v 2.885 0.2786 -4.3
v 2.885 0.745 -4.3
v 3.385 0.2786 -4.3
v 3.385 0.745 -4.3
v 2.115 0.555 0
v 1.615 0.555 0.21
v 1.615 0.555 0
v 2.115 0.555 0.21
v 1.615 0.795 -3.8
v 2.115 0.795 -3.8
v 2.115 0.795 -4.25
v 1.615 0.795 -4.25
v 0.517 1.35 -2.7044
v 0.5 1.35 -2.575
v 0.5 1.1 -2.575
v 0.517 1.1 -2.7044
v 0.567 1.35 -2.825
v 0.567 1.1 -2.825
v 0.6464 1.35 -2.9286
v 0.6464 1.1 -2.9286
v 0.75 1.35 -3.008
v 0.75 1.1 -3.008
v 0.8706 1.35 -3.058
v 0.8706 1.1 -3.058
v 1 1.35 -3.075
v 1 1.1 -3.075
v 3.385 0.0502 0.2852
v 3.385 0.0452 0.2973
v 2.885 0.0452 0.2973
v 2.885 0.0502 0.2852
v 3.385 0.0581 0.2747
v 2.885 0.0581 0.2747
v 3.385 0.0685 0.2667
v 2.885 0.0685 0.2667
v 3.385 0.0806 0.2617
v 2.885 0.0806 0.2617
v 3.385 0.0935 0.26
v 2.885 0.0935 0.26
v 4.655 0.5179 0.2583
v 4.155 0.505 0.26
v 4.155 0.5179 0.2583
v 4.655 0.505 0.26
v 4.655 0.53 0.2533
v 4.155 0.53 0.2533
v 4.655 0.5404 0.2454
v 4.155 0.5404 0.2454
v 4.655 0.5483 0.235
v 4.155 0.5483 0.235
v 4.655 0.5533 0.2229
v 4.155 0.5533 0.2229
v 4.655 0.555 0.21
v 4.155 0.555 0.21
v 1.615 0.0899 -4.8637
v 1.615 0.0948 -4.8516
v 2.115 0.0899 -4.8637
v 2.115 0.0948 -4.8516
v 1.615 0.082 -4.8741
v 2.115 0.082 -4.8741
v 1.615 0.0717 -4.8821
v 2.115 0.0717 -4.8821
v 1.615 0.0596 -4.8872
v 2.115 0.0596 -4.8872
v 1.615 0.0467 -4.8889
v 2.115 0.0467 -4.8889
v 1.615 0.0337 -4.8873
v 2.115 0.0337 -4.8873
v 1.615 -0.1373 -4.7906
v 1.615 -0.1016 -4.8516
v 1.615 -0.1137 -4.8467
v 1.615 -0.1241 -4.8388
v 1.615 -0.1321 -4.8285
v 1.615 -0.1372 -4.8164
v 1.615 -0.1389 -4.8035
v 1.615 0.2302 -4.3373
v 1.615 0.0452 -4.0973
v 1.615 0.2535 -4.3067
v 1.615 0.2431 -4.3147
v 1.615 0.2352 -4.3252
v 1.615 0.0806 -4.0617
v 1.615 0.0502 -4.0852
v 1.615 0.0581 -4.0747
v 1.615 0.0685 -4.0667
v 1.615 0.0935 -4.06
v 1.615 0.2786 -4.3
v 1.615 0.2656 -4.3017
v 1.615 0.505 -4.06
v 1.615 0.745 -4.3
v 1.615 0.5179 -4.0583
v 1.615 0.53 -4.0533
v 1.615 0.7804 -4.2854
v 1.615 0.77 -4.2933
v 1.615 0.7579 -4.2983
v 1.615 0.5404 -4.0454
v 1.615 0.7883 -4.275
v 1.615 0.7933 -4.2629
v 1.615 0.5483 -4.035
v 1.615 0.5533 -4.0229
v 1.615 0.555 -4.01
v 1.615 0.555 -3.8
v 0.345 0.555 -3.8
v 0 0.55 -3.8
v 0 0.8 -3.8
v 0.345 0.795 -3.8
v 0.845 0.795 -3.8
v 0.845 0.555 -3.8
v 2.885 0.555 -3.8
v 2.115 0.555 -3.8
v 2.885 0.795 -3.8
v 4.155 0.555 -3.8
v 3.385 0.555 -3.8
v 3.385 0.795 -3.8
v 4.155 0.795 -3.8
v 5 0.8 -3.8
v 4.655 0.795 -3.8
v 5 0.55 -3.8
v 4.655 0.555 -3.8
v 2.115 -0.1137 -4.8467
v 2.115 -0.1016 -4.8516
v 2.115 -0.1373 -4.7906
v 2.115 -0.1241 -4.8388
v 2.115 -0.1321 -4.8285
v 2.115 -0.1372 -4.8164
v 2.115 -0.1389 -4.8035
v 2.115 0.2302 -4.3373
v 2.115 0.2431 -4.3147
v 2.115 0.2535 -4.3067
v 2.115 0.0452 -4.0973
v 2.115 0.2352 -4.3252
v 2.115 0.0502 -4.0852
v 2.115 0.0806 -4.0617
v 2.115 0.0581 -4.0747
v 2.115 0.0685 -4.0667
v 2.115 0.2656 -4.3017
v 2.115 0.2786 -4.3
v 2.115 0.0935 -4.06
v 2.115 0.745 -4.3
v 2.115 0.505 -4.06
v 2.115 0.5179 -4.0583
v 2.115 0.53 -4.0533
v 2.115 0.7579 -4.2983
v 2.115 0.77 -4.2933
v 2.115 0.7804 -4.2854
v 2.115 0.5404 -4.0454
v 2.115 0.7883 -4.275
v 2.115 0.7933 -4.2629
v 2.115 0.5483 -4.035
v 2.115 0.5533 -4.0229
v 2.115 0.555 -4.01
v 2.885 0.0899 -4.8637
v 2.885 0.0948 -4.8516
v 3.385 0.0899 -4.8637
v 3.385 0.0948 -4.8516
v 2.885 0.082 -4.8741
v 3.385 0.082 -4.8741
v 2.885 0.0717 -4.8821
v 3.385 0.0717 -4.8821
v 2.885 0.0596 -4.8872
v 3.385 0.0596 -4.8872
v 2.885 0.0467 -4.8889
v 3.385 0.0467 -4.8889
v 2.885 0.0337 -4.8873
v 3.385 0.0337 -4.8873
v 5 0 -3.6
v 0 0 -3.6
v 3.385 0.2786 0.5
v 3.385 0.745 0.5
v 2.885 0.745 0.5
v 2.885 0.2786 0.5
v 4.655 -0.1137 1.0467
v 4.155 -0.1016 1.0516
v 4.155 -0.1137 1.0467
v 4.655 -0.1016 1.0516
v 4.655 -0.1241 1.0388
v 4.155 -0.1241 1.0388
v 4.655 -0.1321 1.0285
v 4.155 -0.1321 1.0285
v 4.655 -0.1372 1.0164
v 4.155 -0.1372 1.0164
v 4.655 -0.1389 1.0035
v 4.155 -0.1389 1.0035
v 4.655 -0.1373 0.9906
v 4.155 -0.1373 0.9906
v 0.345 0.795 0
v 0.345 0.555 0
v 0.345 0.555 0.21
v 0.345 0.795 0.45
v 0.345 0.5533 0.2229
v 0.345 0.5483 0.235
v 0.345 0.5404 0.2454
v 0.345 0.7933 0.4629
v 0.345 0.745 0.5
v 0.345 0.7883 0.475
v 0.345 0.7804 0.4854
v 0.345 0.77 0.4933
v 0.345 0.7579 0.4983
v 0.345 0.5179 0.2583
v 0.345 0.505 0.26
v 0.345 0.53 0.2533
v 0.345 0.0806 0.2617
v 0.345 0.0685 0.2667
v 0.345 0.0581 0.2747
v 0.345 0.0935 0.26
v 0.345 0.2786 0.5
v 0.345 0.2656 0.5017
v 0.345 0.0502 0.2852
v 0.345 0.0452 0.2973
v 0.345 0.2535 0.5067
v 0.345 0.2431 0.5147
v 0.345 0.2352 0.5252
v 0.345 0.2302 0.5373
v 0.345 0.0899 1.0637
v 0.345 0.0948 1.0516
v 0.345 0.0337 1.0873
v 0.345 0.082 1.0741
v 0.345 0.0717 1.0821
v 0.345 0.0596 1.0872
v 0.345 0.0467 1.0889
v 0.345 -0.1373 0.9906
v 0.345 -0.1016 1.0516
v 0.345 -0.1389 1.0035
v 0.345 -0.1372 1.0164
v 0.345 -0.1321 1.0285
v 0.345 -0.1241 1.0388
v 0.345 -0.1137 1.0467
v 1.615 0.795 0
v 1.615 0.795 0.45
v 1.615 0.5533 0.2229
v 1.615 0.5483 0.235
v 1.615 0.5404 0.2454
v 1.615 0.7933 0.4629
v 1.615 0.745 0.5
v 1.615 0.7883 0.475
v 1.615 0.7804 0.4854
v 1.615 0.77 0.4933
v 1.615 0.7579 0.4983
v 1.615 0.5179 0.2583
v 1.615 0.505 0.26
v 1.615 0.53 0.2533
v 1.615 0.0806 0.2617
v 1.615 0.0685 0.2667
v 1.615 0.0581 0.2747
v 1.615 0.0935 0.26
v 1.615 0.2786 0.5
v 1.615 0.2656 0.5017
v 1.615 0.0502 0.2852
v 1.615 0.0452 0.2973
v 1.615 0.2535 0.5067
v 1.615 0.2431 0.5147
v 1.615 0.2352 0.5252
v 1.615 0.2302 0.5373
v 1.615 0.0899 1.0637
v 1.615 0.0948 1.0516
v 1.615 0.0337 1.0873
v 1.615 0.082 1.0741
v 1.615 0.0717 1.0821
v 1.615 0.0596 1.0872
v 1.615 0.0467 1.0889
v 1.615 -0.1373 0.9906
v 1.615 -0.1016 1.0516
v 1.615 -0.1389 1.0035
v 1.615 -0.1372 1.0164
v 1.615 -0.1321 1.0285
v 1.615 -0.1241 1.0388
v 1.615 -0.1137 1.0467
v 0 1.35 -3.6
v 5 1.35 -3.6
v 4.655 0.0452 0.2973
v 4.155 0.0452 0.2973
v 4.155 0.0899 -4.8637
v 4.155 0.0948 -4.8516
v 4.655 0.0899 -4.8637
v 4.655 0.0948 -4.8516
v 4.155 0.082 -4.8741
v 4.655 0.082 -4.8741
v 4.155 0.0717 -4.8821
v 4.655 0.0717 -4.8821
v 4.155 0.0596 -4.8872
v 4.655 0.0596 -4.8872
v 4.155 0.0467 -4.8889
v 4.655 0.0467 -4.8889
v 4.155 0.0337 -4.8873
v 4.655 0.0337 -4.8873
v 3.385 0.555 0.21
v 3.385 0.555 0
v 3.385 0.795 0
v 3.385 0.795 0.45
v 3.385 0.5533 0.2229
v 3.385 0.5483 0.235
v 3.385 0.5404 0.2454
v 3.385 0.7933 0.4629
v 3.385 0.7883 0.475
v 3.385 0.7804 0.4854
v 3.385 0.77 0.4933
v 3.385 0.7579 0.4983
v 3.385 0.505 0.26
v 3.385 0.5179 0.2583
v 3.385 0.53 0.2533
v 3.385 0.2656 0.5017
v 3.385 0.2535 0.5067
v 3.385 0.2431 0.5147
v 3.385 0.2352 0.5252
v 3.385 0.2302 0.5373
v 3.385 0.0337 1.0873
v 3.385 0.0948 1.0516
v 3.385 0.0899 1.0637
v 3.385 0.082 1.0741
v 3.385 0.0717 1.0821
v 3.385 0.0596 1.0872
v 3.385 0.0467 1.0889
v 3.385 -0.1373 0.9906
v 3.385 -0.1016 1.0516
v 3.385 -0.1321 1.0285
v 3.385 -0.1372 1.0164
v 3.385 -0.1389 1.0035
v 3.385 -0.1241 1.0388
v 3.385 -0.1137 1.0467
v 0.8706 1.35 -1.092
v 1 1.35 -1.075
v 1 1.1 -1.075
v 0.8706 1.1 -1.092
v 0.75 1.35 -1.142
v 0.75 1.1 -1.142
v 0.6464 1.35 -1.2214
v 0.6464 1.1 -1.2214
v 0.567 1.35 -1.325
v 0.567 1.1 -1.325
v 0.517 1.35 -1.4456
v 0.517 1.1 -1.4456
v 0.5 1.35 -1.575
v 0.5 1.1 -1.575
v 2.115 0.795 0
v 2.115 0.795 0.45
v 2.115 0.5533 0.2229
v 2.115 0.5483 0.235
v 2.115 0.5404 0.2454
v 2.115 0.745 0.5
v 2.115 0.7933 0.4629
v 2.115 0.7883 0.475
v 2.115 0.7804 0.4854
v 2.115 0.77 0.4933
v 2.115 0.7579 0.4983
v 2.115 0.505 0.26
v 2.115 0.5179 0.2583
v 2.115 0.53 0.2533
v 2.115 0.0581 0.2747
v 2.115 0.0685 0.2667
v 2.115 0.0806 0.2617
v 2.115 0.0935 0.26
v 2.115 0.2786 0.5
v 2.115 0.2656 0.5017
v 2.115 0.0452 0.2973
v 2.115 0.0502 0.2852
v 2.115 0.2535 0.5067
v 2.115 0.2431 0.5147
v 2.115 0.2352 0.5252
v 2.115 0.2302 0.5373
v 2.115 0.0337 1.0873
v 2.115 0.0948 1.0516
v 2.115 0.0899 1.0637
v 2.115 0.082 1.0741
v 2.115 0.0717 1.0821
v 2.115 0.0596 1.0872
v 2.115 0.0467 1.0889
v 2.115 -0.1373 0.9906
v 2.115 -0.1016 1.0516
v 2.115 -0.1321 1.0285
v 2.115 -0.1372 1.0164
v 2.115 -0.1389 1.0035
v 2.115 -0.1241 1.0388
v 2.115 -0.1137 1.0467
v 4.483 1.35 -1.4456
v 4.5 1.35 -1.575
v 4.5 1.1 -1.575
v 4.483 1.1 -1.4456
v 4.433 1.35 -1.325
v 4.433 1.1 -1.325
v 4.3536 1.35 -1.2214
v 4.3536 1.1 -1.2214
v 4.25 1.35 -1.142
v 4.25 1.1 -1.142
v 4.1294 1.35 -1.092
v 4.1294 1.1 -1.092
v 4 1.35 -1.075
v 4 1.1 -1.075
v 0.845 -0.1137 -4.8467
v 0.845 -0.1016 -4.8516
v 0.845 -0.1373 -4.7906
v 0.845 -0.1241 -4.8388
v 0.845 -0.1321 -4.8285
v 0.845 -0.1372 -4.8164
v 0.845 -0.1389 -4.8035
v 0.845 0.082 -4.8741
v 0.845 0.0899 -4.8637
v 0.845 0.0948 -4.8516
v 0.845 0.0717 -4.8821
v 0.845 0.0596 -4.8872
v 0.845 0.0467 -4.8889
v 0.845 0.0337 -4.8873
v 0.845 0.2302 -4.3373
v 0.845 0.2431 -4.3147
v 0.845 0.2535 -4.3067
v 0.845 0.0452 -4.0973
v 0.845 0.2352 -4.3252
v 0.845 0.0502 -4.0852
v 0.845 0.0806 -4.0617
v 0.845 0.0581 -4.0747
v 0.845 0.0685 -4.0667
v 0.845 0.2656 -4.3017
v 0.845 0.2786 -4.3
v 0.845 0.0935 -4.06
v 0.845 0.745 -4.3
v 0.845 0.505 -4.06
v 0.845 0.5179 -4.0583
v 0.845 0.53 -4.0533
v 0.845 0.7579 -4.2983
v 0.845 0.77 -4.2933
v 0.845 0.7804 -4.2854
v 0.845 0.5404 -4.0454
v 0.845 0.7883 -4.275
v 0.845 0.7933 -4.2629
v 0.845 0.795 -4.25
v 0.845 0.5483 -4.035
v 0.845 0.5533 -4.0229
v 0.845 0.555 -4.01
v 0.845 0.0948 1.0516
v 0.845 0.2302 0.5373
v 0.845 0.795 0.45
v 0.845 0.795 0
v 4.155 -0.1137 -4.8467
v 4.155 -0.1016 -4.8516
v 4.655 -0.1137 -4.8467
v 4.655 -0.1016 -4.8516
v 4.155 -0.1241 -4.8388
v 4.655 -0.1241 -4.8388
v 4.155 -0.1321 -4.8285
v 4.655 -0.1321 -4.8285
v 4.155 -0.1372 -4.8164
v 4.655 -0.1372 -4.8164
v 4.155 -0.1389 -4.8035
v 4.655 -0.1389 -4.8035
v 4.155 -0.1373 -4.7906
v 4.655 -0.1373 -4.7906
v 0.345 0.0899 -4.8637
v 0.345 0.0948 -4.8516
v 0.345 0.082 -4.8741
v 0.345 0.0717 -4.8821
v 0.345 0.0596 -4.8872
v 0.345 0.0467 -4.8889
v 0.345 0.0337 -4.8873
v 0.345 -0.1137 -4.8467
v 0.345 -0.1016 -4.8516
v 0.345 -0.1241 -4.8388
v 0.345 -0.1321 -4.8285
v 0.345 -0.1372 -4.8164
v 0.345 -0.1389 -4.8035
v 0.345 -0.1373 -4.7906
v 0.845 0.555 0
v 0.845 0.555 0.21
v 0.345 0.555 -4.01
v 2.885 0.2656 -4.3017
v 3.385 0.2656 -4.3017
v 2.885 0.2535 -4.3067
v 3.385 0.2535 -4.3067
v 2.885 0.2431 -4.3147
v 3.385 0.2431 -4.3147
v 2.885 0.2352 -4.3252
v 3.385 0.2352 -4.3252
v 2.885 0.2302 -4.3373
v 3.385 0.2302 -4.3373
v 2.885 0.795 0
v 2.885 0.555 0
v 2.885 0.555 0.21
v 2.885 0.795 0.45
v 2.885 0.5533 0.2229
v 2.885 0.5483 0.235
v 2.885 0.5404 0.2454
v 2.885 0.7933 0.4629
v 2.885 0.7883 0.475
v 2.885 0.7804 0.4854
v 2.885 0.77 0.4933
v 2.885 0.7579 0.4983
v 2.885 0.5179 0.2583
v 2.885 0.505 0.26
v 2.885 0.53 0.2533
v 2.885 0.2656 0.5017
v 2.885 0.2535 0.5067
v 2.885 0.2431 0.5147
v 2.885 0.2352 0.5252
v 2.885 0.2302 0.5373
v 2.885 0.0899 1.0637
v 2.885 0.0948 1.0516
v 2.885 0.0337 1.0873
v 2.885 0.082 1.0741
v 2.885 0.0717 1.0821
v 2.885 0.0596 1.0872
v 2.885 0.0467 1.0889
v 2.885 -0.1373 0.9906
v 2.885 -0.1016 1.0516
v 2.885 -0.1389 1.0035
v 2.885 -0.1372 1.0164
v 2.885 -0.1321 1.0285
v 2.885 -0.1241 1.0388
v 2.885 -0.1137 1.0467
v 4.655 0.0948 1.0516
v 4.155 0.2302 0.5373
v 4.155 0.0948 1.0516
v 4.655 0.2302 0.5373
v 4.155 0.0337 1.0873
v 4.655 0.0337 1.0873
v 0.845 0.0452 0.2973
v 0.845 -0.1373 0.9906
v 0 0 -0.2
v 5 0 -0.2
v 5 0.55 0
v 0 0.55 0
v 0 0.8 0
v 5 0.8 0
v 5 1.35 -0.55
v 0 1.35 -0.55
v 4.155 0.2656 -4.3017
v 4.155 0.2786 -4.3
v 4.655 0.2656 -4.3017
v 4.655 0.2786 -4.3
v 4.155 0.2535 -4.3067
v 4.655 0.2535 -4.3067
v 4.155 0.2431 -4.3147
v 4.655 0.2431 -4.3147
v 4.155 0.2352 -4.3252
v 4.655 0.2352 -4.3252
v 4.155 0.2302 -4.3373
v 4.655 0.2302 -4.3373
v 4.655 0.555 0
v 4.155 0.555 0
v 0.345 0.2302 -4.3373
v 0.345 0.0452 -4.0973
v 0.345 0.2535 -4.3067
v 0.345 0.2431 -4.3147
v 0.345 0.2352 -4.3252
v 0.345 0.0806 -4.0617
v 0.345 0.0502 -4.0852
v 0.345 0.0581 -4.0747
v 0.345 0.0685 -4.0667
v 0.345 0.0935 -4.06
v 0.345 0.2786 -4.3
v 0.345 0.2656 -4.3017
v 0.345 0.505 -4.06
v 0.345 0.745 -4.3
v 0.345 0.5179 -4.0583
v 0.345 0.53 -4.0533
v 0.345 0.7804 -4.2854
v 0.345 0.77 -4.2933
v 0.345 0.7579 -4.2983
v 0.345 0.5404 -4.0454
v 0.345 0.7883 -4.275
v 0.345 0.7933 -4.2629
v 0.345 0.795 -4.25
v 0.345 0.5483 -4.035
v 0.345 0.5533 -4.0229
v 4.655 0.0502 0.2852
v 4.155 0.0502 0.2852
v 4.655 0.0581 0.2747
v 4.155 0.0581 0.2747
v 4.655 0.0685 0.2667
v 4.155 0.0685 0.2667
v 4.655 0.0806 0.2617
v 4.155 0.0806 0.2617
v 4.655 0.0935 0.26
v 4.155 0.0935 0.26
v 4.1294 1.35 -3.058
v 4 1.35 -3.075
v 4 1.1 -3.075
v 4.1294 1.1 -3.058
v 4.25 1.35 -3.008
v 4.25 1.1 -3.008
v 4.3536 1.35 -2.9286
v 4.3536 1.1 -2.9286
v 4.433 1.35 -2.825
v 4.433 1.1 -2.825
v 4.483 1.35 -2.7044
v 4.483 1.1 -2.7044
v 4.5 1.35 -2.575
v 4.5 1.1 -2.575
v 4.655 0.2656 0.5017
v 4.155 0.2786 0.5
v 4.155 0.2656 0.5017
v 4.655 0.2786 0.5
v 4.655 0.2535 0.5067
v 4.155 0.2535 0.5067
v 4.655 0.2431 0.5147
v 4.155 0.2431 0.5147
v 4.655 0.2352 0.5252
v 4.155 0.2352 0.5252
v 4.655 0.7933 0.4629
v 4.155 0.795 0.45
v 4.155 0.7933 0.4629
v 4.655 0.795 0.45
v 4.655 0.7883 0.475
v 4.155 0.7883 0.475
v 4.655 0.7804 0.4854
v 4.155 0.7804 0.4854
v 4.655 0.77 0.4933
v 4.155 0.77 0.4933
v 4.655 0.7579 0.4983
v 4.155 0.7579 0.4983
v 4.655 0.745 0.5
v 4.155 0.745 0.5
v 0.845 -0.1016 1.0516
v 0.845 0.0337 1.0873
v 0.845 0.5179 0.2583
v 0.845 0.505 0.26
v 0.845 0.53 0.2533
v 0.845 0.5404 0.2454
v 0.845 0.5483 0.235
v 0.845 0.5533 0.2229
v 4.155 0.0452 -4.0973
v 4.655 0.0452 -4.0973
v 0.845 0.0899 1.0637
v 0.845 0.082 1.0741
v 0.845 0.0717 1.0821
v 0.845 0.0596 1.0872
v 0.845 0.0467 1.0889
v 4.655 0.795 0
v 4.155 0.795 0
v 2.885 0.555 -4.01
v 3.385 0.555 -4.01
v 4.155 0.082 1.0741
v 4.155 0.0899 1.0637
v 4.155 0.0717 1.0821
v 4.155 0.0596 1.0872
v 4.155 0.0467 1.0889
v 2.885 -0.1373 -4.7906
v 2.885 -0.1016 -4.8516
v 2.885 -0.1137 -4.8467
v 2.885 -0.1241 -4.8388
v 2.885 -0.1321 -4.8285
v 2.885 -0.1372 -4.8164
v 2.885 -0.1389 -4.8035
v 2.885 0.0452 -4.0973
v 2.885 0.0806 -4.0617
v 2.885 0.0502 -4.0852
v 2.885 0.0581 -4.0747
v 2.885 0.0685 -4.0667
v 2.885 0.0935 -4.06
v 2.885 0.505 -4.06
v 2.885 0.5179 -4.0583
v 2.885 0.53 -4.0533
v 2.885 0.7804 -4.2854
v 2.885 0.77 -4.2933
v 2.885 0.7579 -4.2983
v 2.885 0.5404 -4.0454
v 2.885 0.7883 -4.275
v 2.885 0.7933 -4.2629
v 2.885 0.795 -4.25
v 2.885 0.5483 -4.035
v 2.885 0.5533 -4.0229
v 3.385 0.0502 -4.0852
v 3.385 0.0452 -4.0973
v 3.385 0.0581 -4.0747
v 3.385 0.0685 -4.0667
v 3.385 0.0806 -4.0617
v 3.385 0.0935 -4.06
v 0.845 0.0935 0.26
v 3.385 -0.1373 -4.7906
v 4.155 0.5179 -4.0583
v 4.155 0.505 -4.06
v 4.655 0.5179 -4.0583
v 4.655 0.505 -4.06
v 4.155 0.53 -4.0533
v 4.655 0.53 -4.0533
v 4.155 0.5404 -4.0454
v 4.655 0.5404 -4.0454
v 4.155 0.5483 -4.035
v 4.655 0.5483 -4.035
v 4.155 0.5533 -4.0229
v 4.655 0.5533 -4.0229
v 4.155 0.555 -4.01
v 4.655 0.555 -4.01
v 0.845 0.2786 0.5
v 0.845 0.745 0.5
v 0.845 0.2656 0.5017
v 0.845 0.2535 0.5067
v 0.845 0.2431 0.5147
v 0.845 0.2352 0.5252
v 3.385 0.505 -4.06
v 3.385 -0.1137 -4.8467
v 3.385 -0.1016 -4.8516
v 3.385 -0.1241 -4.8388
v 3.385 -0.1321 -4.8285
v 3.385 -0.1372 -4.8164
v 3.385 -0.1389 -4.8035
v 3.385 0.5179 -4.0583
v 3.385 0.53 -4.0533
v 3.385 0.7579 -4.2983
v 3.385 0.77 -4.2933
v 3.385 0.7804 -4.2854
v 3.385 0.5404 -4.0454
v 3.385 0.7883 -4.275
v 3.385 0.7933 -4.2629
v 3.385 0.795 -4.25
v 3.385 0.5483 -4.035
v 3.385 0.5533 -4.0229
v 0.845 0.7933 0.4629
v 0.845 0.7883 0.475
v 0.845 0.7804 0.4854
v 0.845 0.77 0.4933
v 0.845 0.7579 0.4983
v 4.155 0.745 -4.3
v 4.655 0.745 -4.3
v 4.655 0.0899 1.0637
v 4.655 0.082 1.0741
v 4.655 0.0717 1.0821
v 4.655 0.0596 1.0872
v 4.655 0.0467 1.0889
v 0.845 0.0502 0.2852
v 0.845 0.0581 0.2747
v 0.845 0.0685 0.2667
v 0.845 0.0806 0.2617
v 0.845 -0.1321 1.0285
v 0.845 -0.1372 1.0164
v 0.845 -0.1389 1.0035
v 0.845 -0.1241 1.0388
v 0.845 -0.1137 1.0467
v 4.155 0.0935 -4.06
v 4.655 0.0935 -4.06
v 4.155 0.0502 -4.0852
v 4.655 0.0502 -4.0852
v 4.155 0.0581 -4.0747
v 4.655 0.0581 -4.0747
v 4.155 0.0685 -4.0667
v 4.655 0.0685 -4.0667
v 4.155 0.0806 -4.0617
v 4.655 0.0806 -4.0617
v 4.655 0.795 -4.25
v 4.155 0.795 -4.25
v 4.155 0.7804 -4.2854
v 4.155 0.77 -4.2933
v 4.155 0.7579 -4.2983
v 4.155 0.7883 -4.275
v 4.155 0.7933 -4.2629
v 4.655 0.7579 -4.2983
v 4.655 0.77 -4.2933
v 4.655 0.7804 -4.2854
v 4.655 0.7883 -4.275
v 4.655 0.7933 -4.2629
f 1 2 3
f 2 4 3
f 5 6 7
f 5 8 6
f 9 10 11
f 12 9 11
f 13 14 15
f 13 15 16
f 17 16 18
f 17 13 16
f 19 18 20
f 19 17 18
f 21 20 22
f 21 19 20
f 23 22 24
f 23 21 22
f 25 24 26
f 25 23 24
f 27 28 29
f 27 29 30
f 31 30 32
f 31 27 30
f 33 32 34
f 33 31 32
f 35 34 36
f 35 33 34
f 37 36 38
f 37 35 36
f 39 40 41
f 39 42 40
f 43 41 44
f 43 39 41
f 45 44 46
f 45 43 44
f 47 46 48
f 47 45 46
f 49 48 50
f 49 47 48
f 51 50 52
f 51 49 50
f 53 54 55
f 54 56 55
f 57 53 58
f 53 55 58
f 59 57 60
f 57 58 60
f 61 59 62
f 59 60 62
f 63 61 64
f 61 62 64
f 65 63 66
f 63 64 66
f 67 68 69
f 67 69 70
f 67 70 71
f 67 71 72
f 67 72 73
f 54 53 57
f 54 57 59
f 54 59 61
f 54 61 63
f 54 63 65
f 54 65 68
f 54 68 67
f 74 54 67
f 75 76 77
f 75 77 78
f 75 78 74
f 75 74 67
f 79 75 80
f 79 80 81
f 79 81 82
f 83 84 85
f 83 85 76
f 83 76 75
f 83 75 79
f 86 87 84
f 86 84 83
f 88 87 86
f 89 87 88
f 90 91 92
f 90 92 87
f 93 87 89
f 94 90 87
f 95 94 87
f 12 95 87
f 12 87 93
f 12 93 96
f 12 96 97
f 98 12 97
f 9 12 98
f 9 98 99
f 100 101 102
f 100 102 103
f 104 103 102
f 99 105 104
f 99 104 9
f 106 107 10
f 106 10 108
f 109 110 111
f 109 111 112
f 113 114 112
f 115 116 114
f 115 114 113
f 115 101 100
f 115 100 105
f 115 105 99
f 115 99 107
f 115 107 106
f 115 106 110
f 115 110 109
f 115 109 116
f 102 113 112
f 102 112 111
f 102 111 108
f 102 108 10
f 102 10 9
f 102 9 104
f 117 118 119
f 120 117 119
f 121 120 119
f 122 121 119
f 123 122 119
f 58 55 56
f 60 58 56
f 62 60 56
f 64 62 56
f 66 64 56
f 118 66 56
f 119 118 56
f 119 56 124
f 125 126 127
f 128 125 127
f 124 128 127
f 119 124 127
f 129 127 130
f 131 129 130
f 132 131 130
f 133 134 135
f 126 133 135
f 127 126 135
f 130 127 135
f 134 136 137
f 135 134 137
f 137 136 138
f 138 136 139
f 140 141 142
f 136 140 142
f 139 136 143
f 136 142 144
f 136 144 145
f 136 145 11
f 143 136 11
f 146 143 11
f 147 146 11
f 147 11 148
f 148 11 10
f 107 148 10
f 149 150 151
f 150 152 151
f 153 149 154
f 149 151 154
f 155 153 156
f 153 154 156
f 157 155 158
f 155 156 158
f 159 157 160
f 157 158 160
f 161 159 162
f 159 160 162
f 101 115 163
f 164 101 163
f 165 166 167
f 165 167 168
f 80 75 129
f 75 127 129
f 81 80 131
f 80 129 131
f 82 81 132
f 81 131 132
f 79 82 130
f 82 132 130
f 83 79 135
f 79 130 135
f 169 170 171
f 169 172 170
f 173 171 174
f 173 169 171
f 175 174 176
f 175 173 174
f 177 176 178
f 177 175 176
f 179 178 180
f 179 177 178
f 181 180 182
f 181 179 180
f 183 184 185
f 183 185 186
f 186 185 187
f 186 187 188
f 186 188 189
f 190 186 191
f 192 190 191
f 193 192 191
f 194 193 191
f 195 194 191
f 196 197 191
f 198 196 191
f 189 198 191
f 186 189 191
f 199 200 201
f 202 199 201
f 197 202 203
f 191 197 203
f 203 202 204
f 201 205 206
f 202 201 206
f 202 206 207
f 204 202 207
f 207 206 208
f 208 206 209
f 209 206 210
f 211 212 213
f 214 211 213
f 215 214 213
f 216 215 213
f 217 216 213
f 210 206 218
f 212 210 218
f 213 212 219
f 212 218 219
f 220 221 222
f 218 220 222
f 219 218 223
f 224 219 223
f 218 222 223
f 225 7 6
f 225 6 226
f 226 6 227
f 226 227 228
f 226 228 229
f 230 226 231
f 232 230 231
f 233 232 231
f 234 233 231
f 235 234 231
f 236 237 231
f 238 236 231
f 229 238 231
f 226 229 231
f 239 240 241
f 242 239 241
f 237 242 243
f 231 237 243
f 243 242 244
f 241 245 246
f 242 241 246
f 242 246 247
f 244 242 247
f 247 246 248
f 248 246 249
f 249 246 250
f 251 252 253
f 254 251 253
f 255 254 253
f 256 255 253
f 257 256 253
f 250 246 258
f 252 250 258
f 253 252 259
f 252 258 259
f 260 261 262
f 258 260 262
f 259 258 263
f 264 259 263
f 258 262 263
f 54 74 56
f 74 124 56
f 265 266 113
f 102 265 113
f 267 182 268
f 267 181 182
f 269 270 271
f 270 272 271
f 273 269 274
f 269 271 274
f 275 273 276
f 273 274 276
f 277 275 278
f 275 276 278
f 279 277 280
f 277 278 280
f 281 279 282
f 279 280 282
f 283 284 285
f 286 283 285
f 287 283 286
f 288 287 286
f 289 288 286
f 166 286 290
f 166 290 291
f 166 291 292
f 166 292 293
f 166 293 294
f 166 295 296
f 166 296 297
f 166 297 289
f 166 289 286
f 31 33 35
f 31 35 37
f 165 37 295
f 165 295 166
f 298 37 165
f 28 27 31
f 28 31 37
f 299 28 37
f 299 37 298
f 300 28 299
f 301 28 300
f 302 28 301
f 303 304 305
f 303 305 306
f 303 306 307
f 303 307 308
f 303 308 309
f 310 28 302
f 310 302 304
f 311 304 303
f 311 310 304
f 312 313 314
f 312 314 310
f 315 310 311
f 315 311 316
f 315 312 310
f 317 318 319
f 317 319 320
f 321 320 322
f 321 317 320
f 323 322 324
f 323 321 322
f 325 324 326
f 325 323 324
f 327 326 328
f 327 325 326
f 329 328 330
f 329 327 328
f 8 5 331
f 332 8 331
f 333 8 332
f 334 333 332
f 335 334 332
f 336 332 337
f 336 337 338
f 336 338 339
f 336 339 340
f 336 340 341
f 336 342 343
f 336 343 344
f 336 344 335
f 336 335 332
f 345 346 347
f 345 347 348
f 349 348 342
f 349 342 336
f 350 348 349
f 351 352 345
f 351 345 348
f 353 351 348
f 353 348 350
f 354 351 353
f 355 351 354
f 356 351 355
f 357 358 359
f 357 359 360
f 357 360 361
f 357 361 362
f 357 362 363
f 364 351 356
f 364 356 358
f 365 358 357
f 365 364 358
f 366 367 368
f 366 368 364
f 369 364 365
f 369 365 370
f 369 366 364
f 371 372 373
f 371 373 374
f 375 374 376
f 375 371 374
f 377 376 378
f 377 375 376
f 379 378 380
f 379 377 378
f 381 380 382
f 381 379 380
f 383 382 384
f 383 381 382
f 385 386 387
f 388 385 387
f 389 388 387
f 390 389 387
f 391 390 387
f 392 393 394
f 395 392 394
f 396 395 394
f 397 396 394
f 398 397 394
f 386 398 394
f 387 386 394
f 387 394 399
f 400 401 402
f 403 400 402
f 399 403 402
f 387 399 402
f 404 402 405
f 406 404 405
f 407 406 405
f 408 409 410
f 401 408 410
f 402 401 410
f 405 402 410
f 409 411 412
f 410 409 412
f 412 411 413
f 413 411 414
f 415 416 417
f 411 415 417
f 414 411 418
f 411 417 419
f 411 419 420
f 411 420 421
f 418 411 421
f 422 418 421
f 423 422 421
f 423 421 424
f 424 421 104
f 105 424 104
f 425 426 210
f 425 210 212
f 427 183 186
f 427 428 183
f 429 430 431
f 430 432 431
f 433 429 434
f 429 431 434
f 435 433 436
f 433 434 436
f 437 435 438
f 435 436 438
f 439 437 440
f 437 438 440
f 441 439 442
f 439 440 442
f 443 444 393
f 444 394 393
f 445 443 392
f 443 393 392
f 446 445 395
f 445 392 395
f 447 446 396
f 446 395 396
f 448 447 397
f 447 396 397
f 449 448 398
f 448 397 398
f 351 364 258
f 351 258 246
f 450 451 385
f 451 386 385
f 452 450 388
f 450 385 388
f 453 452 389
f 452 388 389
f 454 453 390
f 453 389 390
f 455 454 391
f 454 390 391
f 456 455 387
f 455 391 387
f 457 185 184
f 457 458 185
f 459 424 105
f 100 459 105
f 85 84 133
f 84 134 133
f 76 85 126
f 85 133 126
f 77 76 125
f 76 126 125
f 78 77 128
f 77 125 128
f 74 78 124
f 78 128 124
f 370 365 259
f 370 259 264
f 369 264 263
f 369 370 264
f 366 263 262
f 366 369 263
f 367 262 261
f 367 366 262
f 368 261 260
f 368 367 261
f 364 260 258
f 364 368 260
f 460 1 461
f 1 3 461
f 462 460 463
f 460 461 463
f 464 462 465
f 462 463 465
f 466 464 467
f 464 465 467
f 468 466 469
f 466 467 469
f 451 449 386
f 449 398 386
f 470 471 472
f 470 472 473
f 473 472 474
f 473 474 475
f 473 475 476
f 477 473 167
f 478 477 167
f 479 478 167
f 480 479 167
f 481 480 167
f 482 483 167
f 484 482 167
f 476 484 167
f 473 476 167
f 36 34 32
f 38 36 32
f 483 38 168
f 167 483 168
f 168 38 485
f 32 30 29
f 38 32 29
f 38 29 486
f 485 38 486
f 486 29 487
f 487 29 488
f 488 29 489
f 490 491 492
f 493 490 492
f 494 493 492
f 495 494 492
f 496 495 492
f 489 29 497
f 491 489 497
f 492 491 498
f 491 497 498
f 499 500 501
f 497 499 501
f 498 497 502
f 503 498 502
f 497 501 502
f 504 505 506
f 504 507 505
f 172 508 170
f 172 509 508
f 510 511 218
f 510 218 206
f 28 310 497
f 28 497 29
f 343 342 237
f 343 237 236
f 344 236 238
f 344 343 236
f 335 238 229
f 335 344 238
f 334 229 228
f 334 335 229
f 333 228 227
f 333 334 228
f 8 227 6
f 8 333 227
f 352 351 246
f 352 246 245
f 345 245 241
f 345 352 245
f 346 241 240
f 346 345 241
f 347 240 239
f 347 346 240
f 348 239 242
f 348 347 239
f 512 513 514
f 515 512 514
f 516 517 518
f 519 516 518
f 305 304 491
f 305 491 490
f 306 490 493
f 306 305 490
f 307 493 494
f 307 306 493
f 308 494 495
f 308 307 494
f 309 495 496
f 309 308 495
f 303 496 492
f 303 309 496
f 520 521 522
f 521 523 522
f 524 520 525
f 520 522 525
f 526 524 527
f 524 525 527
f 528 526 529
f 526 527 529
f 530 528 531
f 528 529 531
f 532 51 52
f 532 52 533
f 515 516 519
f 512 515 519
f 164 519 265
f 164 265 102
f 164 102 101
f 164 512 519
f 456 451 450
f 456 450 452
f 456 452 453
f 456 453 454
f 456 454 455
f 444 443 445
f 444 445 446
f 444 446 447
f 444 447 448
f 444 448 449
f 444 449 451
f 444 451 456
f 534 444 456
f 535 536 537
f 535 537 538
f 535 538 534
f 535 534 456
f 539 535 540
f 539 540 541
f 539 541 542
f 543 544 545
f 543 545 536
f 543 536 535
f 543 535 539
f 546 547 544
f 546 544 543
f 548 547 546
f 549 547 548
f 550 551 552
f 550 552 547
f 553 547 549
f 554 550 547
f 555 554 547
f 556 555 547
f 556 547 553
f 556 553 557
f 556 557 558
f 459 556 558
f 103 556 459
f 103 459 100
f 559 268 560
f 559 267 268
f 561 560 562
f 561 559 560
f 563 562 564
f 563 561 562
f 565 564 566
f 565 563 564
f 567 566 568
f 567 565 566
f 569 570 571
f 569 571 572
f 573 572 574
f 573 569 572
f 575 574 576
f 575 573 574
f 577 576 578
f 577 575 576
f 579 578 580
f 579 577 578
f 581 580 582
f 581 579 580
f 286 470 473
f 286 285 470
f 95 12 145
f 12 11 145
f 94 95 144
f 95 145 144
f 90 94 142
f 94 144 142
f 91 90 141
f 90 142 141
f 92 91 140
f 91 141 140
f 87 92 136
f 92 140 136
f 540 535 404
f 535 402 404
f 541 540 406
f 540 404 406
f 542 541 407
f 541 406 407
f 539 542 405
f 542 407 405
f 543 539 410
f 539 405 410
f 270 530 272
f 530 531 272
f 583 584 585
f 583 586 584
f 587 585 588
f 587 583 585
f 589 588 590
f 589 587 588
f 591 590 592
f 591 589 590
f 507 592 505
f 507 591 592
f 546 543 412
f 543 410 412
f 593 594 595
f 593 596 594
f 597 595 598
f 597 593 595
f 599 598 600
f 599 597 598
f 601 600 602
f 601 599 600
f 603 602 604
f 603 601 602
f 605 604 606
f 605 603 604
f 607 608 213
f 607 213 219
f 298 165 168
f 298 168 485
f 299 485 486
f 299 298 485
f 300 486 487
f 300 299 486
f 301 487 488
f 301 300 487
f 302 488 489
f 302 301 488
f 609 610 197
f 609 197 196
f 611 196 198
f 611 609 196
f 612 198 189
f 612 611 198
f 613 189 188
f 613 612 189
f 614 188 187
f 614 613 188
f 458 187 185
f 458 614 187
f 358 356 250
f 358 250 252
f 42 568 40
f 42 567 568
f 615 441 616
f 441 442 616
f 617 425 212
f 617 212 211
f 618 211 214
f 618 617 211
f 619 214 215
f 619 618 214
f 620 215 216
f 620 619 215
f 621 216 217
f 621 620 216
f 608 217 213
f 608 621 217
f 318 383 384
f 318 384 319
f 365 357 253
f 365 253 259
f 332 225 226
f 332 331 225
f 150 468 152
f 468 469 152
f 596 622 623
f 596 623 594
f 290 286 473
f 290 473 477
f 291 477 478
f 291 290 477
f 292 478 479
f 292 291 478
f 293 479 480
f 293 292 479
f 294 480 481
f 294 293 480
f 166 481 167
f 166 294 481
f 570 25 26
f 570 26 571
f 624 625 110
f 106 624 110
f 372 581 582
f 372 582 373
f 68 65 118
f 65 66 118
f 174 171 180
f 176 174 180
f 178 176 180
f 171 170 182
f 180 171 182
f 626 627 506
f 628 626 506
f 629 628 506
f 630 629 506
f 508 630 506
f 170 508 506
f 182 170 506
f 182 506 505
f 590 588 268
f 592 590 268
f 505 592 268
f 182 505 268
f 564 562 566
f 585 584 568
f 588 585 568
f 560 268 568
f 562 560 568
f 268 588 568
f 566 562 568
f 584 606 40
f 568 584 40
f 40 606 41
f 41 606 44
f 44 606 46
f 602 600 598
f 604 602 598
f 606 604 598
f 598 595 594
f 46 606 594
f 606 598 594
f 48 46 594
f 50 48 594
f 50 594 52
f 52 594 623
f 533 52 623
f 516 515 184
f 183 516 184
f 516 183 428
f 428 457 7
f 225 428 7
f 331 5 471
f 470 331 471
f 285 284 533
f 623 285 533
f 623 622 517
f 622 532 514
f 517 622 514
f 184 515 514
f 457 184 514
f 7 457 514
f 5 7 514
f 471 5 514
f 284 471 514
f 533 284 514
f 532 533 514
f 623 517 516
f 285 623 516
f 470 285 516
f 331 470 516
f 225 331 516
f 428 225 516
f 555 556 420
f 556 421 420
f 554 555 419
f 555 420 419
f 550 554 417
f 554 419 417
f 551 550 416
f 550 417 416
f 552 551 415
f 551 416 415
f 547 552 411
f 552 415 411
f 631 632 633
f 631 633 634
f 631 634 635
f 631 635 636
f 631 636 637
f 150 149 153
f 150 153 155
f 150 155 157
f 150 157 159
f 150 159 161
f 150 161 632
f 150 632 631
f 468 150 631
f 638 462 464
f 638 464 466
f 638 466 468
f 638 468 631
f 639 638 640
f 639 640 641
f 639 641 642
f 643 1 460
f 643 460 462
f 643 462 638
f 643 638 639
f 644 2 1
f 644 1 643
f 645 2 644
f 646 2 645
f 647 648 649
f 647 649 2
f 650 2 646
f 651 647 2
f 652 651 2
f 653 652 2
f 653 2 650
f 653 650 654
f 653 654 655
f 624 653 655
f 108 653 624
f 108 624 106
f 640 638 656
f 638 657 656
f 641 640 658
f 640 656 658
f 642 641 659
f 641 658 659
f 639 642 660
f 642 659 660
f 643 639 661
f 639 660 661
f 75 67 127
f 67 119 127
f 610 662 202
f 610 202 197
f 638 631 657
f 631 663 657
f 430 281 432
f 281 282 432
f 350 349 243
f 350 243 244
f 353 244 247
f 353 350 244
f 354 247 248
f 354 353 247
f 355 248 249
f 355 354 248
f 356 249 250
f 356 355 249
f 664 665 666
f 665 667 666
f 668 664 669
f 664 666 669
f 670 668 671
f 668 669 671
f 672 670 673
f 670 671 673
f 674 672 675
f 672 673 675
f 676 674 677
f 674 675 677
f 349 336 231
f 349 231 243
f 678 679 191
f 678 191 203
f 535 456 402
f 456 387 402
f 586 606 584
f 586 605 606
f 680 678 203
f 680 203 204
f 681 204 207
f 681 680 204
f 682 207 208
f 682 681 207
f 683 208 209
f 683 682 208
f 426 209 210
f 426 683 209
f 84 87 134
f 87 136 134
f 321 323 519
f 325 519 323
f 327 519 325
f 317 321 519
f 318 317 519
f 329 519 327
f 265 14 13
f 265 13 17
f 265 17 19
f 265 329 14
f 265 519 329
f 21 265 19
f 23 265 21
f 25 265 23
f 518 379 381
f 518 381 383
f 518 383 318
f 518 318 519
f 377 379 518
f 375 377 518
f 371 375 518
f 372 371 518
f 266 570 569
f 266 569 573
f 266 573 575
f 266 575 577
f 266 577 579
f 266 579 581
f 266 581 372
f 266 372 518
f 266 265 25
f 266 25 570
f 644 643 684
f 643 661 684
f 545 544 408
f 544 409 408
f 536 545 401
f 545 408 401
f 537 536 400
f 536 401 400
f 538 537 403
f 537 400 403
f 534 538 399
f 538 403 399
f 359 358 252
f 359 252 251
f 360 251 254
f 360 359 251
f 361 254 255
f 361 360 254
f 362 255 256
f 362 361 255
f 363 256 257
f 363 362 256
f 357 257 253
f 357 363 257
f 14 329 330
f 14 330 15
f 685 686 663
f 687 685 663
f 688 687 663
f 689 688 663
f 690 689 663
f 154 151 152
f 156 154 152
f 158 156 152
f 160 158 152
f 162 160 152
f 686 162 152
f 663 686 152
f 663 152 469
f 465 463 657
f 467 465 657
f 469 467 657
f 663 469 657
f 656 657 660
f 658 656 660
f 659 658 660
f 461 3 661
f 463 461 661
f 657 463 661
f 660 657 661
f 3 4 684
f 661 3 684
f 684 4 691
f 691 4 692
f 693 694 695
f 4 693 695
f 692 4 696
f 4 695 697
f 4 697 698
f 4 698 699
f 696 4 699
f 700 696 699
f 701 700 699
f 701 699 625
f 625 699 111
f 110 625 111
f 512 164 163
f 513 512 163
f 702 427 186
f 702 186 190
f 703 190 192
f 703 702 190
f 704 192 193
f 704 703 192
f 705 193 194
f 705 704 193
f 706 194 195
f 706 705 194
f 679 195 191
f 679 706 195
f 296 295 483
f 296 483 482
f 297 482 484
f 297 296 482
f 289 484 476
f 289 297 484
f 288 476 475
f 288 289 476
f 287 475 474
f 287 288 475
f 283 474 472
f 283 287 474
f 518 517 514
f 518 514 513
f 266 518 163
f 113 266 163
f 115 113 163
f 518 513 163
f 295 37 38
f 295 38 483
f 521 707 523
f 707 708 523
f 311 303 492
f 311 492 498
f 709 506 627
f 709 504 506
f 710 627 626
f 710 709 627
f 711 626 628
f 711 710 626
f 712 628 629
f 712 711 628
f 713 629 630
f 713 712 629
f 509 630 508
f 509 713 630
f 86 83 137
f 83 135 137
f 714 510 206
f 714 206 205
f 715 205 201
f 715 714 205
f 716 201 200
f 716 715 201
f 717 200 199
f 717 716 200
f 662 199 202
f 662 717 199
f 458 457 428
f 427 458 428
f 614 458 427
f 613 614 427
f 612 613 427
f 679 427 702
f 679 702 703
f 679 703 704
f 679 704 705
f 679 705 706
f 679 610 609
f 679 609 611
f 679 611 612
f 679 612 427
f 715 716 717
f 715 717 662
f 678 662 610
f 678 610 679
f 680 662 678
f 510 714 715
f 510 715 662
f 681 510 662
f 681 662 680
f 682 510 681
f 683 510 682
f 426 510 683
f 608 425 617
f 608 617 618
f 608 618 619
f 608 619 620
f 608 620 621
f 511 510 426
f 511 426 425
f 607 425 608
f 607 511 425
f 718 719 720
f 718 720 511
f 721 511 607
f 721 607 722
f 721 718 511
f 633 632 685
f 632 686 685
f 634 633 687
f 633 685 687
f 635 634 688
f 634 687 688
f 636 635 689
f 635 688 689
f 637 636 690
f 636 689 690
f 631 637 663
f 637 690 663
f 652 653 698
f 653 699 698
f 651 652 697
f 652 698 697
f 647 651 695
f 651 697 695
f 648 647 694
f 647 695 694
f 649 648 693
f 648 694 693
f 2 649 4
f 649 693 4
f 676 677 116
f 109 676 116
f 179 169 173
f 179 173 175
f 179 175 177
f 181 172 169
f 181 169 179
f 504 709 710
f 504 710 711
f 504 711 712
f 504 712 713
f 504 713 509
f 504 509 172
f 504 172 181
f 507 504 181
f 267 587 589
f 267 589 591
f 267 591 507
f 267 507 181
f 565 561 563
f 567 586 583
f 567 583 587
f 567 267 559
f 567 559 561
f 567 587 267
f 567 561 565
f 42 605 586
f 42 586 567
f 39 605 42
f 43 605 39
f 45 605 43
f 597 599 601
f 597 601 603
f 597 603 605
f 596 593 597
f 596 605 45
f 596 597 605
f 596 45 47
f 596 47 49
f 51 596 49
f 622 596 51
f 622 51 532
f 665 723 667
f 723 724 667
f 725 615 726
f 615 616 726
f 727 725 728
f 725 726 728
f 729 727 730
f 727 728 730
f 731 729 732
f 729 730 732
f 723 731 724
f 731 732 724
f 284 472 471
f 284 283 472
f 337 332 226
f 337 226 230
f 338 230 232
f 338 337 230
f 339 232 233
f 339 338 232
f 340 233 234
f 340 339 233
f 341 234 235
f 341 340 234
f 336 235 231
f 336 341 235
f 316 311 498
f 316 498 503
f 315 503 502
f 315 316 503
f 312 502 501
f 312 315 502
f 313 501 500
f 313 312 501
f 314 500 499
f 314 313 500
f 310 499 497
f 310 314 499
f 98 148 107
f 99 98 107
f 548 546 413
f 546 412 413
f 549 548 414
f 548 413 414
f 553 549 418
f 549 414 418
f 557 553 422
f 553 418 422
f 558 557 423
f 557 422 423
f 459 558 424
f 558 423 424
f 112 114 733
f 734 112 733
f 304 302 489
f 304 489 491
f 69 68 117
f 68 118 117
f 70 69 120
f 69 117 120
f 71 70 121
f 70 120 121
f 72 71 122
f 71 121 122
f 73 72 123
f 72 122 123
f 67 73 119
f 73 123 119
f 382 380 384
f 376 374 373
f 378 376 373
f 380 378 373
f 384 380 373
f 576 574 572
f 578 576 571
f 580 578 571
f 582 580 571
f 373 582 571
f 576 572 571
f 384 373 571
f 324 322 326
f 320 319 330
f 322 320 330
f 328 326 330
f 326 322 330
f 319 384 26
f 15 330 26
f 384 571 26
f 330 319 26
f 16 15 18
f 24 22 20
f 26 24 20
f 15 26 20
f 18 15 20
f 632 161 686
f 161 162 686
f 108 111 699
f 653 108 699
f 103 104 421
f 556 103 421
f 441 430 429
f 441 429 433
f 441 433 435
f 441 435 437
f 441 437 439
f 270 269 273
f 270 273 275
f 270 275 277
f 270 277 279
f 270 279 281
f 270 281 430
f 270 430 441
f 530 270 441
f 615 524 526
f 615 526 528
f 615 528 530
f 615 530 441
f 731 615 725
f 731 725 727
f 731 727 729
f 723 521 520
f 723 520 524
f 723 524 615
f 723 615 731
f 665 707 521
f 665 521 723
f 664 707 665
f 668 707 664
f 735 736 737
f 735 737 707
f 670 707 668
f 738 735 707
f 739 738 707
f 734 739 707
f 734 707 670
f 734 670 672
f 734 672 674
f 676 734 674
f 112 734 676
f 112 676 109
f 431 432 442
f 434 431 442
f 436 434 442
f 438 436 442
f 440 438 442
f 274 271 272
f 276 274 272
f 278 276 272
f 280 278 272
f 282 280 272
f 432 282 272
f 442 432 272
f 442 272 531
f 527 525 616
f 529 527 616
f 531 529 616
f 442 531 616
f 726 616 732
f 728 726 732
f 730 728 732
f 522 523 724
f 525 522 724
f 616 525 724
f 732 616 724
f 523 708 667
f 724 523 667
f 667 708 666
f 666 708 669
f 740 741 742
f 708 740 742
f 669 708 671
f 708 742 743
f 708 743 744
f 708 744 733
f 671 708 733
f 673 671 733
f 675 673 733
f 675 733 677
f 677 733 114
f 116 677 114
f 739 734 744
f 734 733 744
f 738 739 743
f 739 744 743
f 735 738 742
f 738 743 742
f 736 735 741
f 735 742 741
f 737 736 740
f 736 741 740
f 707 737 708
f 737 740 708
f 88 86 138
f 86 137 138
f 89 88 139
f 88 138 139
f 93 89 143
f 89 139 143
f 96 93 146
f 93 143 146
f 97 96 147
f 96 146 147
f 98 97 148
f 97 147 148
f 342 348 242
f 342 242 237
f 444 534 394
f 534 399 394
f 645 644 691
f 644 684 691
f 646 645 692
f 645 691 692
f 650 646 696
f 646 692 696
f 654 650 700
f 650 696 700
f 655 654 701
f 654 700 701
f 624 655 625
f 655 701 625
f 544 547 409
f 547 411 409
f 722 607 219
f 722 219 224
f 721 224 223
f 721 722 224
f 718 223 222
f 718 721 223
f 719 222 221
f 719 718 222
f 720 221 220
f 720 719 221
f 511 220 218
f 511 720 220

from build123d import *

# Parameters (mm, degrees)
SKETCH1_W            = 5
SKETCH1_H            = 3.8
BOSS_EXTRUDE1_DEPTH  = 1.35
CUT_EXTRUDE1_DEPTH   = 5
CUT_EXTRUDE2_DEPTH   = 0.25
BOSS_EXTRUDE2_DEPTH  = 0.25
LPATTERN1_COUNT      = 4
LPATTERN1_PITCH      = 1.27
MIRROR1_COPY_1_DEPTH = 0.25
MIRROR1_COPY_2_DEPTH = 0.25
MIRROR1_COPY_3_DEPTH = 0.25


with BuildPart() as part:
    # Sketch1 → Boss-Extrude1 (new body)
    with BuildSketch(Plane(origin=(0, 0, 0), x_dir=(1, 0, 0), z_dir=(0, 1, 0))):
        with Locations((2.5, 1.9)):
            Rectangle(SKETCH1_W, SKETCH1_H)
    extrude(amount=BOSS_EXTRUDE1_DEPTH)

    # Sketch2 → Cut-Extrude1 (cut)
    with BuildSketch(Plane(origin=(5, 0, 0), x_dir=(0, 0, -1), z_dir=(1, 0, 0))):
        Polygon((0, 0.8), (0.55, 1.35), (0, 1.35), align=None)
        Polygon((0.2, 0), (0, 0.55), (0, 0), align=None)
        Polygon((3.8, 0), (3.8, 0.55), (3.6, 0), align=None)
        Polygon((3.8, 1.35), (3.6, 1.35), (3.8, 0.8), align=None)
    extrude(amount=-CUT_EXTRUDE1_DEPTH, mode=Mode.SUBTRACT)

    # Sketch3 → Cut-Extrude2 (cut)
    with BuildSketch(Plane(origin=(0, 1.35, 0), x_dir=(1, 0, 0), z_dir=(0, 1, 0))):
        with BuildLine():
            Line((1, 3.075), (4, 3.075))
            ThreePointArc((4, 3.075), (4.353553391, 2.928553391), (4.5, 2.575))
            Line((4.5, 2.575), (4.5, 1.575))
            ThreePointArc((4.5, 1.575), (4.353553391, 1.221446609), (4, 1.075))
            Line((4, 1.075), (1, 1.075))
            ThreePointArc((1, 1.075), (0.646446609, 1.221446609), (0.5, 1.575))
            Line((0.5, 1.575), (0.5, 2.575))
            ThreePointArc((0.5, 2.575), (0.646446609, 2.928553391), (1, 3.075))
        make_face()
    extrude(amount=-CUT_EXTRUDE2_DEPTH, mode=Mode.SUBTRACT)

    # Sketch4 → Boss-Extrude2 (add, symmetric)
    with BuildSketch(Plane(origin=(4.405, 0, 0), x_dir=(0, 0, -1), z_dir=(1, 0, 0))):
        with BuildLine():
            Line((3.8, 0.795), (4.25, 0.795))
            ThreePointArc((4.25, 0.795), (4.285355339, 0.780355339), (4.3, 0.745))
            Line((4.3, 0.745), (4.3, 0.278551504))
            ThreePointArc((4.3, 0.278551504), (4.31040014, 0.248025269), (4.337274043, 0.230198118))
            Line((4.337274043, 0.230198118), (4.851646613, 0.094822214))
            ThreePointArc((4.851646613, 0.094822214), (4.882110274, 0.071661224), (4.887274043, 0.03374287))
            Line((4.887274043, 0.03374287), (4.851641362, -0.101646613))
            ThreePointArc((4.851641362, -0.101646613), (4.828480372, -0.132110274), (4.790562018, -0.137274043))
            Line((4.790562018, -0.137274043), (4.097274043, 0.045189976))
            ThreePointArc((4.097274043, 0.045189976), (4.07040014, 0.063017127), (4.06, 0.093543363))
            Line((4.06, 0.093543363), (4.06, 0.505))
            ThreePointArc((4.06, 0.505), (4.045355339, 0.540355339), (4.01, 0.555))
            Line((4.01, 0.555), (3.8, 0.555))
            Line((3.8, 0.555), (3.8, 0.795))
        make_face()
    boss_extrude2 = extrude(amount=BOSS_EXTRUDE2_DEPTH, both=True)

    # LPattern1: Boss-Extrude2 ×4
    with Locations(*[(-i * LPATTERN1_PITCH, 0, 0) for i in range(1, LPATTERN1_COUNT)]):
        add(boss_extrude2)

    # Mirror1: Boss-Extrude2 across plane
    add(boss_extrude2.mirror(Plane(origin=(0, 0, -1.9), x_dir=(1, 0, 0), z_dir=(0, 0, -1))))

    # Mirror1 copy 1 sketch → Mirror1 copy 1 (add, symmetric)
    with BuildSketch(Plane(origin=(3.135, 0, -3.8), x_dir=(0, 0, 1), z_dir=(1, 0, 0))):
        with BuildLine():
            Line((3.8, -0.795), (4.25, -0.795))
            ThreePointArc((4.25, -0.795), (4.285355339, -0.780355339), (4.3, -0.745))
            Line((4.3, -0.745), (4.3, -0.278551504))
            ThreePointArc((4.3, -0.278551504), (4.31040014, -0.248025269), (4.337274043, -0.230198118))
            Line((4.337274043, -0.230198118), (4.851646613, -0.094822214))
            ThreePointArc((4.851646613, -0.094822214), (4.882110274, -0.071661224), (4.887274043, -0.03374287))
            Line((4.887274043, -0.03374287), (4.851641362, 0.101646613))
            ThreePointArc((4.851641362, 0.101646613), (4.828480372, 0.132110274), (4.790562018, 0.137274043))
            Line((4.790562018, 0.137274043), (4.097274043, -0.045189976))
            ThreePointArc((4.097274043, -0.045189976), (4.07040014, -0.063017127), (4.06, -0.093543363))
            Line((4.06, -0.093543363), (4.06, -0.505))
            ThreePointArc((4.06, -0.505), (4.045355339, -0.540355339), (4.01, -0.555))
            Line((4.01, -0.555), (3.8, -0.555))
            Line((3.8, -0.555), (3.8, -0.795))
        make_face()
    extrude(amount=MIRROR1_COPY_1_DEPTH, both=True)

    # Mirror1 copy 2 sketch → Mirror1 copy 2 (add, symmetric)
    with BuildSketch(Plane(origin=(1.865, 0, -3.8), x_dir=(0, 0, 1), z_dir=(1, 0, 0))):
        with BuildLine():
            Line((3.8, -0.795), (4.25, -0.795))
            ThreePointArc((4.25, -0.795), (4.285355339, -0.780355339), (4.3, -0.745))
            Line((4.3, -0.745), (4.3, -0.278551504))
            ThreePointArc((4.3, -0.278551504), (4.31040014, -0.248025269), (4.337274043, -0.230198118))
            Line((4.337274043, -0.230198118), (4.851646613, -0.094822214))
            ThreePointArc((4.851646613, -0.094822214), (4.882110274, -0.071661224), (4.887274043, -0.03374287))
            Line((4.887274043, -0.03374287), (4.851641362, 0.101646613))
            ThreePointArc((4.851641362, 0.101646613), (4.828480372, 0.132110274), (4.790562018, 0.137274043))
            Line((4.790562018, 0.137274043), (4.097274043, -0.045189976))
            ThreePointArc((4.097274043, -0.045189976), (4.07040014, -0.063017127), (4.06, -0.093543363))
            Line((4.06, -0.093543363), (4.06, -0.505))
            ThreePointArc((4.06, -0.505), (4.045355339, -0.540355339), (4.01, -0.555))
            Line((4.01, -0.555), (3.8, -0.555))
            Line((3.8, -0.555), (3.8, -0.795))
        make_face()
    extrude(amount=MIRROR1_COPY_2_DEPTH, both=True)

    # Mirror1 copy 3 sketch → Mirror1 copy 3 (add, symmetric)
    with BuildSketch(Plane(origin=(0.595, 0, -3.8), x_dir=(0, 0, 1), z_dir=(1, 0, 0))):
        with BuildLine():
            Line((3.8, -0.795), (4.25, -0.795))
            ThreePointArc((4.25, -0.795), (4.285355339, -0.780355339), (4.3, -0.745))
            Line((4.3, -0.745), (4.3, -0.278551504))
            ThreePointArc((4.3, -0.278551504), (4.31040014, -0.248025269), (4.337274043, -0.230198118))
            Line((4.337274043, -0.230198118), (4.851646613, -0.094822214))
            ThreePointArc((4.851646613, -0.094822214), (4.882110274, -0.071661224), (4.887274043, -0.03374287))
            Line((4.887274043, -0.03374287), (4.851641362, 0.101646613))
            ThreePointArc((4.851641362, 0.101646613), (4.828480372, 0.132110274), (4.790562018, 0.137274043))
            Line((4.790562018, 0.137274043), (4.097274043, -0.045189976))
            ThreePointArc((4.097274043, -0.045189976), (4.07040014, -0.063017127), (4.06, -0.093543363))
            Line((4.06, -0.093543363), (4.06, -0.505))
            ThreePointArc((4.06, -0.505), (4.045355339, -0.540355339), (4.01, -0.555))
            Line((4.01, -0.555), (3.8, -0.555))
            Line((3.8, -0.555), (3.8, -0.795))
        make_face()
    extrude(amount=MIRROR1_COPY_3_DEPTH, both=True)


solid = part.part
